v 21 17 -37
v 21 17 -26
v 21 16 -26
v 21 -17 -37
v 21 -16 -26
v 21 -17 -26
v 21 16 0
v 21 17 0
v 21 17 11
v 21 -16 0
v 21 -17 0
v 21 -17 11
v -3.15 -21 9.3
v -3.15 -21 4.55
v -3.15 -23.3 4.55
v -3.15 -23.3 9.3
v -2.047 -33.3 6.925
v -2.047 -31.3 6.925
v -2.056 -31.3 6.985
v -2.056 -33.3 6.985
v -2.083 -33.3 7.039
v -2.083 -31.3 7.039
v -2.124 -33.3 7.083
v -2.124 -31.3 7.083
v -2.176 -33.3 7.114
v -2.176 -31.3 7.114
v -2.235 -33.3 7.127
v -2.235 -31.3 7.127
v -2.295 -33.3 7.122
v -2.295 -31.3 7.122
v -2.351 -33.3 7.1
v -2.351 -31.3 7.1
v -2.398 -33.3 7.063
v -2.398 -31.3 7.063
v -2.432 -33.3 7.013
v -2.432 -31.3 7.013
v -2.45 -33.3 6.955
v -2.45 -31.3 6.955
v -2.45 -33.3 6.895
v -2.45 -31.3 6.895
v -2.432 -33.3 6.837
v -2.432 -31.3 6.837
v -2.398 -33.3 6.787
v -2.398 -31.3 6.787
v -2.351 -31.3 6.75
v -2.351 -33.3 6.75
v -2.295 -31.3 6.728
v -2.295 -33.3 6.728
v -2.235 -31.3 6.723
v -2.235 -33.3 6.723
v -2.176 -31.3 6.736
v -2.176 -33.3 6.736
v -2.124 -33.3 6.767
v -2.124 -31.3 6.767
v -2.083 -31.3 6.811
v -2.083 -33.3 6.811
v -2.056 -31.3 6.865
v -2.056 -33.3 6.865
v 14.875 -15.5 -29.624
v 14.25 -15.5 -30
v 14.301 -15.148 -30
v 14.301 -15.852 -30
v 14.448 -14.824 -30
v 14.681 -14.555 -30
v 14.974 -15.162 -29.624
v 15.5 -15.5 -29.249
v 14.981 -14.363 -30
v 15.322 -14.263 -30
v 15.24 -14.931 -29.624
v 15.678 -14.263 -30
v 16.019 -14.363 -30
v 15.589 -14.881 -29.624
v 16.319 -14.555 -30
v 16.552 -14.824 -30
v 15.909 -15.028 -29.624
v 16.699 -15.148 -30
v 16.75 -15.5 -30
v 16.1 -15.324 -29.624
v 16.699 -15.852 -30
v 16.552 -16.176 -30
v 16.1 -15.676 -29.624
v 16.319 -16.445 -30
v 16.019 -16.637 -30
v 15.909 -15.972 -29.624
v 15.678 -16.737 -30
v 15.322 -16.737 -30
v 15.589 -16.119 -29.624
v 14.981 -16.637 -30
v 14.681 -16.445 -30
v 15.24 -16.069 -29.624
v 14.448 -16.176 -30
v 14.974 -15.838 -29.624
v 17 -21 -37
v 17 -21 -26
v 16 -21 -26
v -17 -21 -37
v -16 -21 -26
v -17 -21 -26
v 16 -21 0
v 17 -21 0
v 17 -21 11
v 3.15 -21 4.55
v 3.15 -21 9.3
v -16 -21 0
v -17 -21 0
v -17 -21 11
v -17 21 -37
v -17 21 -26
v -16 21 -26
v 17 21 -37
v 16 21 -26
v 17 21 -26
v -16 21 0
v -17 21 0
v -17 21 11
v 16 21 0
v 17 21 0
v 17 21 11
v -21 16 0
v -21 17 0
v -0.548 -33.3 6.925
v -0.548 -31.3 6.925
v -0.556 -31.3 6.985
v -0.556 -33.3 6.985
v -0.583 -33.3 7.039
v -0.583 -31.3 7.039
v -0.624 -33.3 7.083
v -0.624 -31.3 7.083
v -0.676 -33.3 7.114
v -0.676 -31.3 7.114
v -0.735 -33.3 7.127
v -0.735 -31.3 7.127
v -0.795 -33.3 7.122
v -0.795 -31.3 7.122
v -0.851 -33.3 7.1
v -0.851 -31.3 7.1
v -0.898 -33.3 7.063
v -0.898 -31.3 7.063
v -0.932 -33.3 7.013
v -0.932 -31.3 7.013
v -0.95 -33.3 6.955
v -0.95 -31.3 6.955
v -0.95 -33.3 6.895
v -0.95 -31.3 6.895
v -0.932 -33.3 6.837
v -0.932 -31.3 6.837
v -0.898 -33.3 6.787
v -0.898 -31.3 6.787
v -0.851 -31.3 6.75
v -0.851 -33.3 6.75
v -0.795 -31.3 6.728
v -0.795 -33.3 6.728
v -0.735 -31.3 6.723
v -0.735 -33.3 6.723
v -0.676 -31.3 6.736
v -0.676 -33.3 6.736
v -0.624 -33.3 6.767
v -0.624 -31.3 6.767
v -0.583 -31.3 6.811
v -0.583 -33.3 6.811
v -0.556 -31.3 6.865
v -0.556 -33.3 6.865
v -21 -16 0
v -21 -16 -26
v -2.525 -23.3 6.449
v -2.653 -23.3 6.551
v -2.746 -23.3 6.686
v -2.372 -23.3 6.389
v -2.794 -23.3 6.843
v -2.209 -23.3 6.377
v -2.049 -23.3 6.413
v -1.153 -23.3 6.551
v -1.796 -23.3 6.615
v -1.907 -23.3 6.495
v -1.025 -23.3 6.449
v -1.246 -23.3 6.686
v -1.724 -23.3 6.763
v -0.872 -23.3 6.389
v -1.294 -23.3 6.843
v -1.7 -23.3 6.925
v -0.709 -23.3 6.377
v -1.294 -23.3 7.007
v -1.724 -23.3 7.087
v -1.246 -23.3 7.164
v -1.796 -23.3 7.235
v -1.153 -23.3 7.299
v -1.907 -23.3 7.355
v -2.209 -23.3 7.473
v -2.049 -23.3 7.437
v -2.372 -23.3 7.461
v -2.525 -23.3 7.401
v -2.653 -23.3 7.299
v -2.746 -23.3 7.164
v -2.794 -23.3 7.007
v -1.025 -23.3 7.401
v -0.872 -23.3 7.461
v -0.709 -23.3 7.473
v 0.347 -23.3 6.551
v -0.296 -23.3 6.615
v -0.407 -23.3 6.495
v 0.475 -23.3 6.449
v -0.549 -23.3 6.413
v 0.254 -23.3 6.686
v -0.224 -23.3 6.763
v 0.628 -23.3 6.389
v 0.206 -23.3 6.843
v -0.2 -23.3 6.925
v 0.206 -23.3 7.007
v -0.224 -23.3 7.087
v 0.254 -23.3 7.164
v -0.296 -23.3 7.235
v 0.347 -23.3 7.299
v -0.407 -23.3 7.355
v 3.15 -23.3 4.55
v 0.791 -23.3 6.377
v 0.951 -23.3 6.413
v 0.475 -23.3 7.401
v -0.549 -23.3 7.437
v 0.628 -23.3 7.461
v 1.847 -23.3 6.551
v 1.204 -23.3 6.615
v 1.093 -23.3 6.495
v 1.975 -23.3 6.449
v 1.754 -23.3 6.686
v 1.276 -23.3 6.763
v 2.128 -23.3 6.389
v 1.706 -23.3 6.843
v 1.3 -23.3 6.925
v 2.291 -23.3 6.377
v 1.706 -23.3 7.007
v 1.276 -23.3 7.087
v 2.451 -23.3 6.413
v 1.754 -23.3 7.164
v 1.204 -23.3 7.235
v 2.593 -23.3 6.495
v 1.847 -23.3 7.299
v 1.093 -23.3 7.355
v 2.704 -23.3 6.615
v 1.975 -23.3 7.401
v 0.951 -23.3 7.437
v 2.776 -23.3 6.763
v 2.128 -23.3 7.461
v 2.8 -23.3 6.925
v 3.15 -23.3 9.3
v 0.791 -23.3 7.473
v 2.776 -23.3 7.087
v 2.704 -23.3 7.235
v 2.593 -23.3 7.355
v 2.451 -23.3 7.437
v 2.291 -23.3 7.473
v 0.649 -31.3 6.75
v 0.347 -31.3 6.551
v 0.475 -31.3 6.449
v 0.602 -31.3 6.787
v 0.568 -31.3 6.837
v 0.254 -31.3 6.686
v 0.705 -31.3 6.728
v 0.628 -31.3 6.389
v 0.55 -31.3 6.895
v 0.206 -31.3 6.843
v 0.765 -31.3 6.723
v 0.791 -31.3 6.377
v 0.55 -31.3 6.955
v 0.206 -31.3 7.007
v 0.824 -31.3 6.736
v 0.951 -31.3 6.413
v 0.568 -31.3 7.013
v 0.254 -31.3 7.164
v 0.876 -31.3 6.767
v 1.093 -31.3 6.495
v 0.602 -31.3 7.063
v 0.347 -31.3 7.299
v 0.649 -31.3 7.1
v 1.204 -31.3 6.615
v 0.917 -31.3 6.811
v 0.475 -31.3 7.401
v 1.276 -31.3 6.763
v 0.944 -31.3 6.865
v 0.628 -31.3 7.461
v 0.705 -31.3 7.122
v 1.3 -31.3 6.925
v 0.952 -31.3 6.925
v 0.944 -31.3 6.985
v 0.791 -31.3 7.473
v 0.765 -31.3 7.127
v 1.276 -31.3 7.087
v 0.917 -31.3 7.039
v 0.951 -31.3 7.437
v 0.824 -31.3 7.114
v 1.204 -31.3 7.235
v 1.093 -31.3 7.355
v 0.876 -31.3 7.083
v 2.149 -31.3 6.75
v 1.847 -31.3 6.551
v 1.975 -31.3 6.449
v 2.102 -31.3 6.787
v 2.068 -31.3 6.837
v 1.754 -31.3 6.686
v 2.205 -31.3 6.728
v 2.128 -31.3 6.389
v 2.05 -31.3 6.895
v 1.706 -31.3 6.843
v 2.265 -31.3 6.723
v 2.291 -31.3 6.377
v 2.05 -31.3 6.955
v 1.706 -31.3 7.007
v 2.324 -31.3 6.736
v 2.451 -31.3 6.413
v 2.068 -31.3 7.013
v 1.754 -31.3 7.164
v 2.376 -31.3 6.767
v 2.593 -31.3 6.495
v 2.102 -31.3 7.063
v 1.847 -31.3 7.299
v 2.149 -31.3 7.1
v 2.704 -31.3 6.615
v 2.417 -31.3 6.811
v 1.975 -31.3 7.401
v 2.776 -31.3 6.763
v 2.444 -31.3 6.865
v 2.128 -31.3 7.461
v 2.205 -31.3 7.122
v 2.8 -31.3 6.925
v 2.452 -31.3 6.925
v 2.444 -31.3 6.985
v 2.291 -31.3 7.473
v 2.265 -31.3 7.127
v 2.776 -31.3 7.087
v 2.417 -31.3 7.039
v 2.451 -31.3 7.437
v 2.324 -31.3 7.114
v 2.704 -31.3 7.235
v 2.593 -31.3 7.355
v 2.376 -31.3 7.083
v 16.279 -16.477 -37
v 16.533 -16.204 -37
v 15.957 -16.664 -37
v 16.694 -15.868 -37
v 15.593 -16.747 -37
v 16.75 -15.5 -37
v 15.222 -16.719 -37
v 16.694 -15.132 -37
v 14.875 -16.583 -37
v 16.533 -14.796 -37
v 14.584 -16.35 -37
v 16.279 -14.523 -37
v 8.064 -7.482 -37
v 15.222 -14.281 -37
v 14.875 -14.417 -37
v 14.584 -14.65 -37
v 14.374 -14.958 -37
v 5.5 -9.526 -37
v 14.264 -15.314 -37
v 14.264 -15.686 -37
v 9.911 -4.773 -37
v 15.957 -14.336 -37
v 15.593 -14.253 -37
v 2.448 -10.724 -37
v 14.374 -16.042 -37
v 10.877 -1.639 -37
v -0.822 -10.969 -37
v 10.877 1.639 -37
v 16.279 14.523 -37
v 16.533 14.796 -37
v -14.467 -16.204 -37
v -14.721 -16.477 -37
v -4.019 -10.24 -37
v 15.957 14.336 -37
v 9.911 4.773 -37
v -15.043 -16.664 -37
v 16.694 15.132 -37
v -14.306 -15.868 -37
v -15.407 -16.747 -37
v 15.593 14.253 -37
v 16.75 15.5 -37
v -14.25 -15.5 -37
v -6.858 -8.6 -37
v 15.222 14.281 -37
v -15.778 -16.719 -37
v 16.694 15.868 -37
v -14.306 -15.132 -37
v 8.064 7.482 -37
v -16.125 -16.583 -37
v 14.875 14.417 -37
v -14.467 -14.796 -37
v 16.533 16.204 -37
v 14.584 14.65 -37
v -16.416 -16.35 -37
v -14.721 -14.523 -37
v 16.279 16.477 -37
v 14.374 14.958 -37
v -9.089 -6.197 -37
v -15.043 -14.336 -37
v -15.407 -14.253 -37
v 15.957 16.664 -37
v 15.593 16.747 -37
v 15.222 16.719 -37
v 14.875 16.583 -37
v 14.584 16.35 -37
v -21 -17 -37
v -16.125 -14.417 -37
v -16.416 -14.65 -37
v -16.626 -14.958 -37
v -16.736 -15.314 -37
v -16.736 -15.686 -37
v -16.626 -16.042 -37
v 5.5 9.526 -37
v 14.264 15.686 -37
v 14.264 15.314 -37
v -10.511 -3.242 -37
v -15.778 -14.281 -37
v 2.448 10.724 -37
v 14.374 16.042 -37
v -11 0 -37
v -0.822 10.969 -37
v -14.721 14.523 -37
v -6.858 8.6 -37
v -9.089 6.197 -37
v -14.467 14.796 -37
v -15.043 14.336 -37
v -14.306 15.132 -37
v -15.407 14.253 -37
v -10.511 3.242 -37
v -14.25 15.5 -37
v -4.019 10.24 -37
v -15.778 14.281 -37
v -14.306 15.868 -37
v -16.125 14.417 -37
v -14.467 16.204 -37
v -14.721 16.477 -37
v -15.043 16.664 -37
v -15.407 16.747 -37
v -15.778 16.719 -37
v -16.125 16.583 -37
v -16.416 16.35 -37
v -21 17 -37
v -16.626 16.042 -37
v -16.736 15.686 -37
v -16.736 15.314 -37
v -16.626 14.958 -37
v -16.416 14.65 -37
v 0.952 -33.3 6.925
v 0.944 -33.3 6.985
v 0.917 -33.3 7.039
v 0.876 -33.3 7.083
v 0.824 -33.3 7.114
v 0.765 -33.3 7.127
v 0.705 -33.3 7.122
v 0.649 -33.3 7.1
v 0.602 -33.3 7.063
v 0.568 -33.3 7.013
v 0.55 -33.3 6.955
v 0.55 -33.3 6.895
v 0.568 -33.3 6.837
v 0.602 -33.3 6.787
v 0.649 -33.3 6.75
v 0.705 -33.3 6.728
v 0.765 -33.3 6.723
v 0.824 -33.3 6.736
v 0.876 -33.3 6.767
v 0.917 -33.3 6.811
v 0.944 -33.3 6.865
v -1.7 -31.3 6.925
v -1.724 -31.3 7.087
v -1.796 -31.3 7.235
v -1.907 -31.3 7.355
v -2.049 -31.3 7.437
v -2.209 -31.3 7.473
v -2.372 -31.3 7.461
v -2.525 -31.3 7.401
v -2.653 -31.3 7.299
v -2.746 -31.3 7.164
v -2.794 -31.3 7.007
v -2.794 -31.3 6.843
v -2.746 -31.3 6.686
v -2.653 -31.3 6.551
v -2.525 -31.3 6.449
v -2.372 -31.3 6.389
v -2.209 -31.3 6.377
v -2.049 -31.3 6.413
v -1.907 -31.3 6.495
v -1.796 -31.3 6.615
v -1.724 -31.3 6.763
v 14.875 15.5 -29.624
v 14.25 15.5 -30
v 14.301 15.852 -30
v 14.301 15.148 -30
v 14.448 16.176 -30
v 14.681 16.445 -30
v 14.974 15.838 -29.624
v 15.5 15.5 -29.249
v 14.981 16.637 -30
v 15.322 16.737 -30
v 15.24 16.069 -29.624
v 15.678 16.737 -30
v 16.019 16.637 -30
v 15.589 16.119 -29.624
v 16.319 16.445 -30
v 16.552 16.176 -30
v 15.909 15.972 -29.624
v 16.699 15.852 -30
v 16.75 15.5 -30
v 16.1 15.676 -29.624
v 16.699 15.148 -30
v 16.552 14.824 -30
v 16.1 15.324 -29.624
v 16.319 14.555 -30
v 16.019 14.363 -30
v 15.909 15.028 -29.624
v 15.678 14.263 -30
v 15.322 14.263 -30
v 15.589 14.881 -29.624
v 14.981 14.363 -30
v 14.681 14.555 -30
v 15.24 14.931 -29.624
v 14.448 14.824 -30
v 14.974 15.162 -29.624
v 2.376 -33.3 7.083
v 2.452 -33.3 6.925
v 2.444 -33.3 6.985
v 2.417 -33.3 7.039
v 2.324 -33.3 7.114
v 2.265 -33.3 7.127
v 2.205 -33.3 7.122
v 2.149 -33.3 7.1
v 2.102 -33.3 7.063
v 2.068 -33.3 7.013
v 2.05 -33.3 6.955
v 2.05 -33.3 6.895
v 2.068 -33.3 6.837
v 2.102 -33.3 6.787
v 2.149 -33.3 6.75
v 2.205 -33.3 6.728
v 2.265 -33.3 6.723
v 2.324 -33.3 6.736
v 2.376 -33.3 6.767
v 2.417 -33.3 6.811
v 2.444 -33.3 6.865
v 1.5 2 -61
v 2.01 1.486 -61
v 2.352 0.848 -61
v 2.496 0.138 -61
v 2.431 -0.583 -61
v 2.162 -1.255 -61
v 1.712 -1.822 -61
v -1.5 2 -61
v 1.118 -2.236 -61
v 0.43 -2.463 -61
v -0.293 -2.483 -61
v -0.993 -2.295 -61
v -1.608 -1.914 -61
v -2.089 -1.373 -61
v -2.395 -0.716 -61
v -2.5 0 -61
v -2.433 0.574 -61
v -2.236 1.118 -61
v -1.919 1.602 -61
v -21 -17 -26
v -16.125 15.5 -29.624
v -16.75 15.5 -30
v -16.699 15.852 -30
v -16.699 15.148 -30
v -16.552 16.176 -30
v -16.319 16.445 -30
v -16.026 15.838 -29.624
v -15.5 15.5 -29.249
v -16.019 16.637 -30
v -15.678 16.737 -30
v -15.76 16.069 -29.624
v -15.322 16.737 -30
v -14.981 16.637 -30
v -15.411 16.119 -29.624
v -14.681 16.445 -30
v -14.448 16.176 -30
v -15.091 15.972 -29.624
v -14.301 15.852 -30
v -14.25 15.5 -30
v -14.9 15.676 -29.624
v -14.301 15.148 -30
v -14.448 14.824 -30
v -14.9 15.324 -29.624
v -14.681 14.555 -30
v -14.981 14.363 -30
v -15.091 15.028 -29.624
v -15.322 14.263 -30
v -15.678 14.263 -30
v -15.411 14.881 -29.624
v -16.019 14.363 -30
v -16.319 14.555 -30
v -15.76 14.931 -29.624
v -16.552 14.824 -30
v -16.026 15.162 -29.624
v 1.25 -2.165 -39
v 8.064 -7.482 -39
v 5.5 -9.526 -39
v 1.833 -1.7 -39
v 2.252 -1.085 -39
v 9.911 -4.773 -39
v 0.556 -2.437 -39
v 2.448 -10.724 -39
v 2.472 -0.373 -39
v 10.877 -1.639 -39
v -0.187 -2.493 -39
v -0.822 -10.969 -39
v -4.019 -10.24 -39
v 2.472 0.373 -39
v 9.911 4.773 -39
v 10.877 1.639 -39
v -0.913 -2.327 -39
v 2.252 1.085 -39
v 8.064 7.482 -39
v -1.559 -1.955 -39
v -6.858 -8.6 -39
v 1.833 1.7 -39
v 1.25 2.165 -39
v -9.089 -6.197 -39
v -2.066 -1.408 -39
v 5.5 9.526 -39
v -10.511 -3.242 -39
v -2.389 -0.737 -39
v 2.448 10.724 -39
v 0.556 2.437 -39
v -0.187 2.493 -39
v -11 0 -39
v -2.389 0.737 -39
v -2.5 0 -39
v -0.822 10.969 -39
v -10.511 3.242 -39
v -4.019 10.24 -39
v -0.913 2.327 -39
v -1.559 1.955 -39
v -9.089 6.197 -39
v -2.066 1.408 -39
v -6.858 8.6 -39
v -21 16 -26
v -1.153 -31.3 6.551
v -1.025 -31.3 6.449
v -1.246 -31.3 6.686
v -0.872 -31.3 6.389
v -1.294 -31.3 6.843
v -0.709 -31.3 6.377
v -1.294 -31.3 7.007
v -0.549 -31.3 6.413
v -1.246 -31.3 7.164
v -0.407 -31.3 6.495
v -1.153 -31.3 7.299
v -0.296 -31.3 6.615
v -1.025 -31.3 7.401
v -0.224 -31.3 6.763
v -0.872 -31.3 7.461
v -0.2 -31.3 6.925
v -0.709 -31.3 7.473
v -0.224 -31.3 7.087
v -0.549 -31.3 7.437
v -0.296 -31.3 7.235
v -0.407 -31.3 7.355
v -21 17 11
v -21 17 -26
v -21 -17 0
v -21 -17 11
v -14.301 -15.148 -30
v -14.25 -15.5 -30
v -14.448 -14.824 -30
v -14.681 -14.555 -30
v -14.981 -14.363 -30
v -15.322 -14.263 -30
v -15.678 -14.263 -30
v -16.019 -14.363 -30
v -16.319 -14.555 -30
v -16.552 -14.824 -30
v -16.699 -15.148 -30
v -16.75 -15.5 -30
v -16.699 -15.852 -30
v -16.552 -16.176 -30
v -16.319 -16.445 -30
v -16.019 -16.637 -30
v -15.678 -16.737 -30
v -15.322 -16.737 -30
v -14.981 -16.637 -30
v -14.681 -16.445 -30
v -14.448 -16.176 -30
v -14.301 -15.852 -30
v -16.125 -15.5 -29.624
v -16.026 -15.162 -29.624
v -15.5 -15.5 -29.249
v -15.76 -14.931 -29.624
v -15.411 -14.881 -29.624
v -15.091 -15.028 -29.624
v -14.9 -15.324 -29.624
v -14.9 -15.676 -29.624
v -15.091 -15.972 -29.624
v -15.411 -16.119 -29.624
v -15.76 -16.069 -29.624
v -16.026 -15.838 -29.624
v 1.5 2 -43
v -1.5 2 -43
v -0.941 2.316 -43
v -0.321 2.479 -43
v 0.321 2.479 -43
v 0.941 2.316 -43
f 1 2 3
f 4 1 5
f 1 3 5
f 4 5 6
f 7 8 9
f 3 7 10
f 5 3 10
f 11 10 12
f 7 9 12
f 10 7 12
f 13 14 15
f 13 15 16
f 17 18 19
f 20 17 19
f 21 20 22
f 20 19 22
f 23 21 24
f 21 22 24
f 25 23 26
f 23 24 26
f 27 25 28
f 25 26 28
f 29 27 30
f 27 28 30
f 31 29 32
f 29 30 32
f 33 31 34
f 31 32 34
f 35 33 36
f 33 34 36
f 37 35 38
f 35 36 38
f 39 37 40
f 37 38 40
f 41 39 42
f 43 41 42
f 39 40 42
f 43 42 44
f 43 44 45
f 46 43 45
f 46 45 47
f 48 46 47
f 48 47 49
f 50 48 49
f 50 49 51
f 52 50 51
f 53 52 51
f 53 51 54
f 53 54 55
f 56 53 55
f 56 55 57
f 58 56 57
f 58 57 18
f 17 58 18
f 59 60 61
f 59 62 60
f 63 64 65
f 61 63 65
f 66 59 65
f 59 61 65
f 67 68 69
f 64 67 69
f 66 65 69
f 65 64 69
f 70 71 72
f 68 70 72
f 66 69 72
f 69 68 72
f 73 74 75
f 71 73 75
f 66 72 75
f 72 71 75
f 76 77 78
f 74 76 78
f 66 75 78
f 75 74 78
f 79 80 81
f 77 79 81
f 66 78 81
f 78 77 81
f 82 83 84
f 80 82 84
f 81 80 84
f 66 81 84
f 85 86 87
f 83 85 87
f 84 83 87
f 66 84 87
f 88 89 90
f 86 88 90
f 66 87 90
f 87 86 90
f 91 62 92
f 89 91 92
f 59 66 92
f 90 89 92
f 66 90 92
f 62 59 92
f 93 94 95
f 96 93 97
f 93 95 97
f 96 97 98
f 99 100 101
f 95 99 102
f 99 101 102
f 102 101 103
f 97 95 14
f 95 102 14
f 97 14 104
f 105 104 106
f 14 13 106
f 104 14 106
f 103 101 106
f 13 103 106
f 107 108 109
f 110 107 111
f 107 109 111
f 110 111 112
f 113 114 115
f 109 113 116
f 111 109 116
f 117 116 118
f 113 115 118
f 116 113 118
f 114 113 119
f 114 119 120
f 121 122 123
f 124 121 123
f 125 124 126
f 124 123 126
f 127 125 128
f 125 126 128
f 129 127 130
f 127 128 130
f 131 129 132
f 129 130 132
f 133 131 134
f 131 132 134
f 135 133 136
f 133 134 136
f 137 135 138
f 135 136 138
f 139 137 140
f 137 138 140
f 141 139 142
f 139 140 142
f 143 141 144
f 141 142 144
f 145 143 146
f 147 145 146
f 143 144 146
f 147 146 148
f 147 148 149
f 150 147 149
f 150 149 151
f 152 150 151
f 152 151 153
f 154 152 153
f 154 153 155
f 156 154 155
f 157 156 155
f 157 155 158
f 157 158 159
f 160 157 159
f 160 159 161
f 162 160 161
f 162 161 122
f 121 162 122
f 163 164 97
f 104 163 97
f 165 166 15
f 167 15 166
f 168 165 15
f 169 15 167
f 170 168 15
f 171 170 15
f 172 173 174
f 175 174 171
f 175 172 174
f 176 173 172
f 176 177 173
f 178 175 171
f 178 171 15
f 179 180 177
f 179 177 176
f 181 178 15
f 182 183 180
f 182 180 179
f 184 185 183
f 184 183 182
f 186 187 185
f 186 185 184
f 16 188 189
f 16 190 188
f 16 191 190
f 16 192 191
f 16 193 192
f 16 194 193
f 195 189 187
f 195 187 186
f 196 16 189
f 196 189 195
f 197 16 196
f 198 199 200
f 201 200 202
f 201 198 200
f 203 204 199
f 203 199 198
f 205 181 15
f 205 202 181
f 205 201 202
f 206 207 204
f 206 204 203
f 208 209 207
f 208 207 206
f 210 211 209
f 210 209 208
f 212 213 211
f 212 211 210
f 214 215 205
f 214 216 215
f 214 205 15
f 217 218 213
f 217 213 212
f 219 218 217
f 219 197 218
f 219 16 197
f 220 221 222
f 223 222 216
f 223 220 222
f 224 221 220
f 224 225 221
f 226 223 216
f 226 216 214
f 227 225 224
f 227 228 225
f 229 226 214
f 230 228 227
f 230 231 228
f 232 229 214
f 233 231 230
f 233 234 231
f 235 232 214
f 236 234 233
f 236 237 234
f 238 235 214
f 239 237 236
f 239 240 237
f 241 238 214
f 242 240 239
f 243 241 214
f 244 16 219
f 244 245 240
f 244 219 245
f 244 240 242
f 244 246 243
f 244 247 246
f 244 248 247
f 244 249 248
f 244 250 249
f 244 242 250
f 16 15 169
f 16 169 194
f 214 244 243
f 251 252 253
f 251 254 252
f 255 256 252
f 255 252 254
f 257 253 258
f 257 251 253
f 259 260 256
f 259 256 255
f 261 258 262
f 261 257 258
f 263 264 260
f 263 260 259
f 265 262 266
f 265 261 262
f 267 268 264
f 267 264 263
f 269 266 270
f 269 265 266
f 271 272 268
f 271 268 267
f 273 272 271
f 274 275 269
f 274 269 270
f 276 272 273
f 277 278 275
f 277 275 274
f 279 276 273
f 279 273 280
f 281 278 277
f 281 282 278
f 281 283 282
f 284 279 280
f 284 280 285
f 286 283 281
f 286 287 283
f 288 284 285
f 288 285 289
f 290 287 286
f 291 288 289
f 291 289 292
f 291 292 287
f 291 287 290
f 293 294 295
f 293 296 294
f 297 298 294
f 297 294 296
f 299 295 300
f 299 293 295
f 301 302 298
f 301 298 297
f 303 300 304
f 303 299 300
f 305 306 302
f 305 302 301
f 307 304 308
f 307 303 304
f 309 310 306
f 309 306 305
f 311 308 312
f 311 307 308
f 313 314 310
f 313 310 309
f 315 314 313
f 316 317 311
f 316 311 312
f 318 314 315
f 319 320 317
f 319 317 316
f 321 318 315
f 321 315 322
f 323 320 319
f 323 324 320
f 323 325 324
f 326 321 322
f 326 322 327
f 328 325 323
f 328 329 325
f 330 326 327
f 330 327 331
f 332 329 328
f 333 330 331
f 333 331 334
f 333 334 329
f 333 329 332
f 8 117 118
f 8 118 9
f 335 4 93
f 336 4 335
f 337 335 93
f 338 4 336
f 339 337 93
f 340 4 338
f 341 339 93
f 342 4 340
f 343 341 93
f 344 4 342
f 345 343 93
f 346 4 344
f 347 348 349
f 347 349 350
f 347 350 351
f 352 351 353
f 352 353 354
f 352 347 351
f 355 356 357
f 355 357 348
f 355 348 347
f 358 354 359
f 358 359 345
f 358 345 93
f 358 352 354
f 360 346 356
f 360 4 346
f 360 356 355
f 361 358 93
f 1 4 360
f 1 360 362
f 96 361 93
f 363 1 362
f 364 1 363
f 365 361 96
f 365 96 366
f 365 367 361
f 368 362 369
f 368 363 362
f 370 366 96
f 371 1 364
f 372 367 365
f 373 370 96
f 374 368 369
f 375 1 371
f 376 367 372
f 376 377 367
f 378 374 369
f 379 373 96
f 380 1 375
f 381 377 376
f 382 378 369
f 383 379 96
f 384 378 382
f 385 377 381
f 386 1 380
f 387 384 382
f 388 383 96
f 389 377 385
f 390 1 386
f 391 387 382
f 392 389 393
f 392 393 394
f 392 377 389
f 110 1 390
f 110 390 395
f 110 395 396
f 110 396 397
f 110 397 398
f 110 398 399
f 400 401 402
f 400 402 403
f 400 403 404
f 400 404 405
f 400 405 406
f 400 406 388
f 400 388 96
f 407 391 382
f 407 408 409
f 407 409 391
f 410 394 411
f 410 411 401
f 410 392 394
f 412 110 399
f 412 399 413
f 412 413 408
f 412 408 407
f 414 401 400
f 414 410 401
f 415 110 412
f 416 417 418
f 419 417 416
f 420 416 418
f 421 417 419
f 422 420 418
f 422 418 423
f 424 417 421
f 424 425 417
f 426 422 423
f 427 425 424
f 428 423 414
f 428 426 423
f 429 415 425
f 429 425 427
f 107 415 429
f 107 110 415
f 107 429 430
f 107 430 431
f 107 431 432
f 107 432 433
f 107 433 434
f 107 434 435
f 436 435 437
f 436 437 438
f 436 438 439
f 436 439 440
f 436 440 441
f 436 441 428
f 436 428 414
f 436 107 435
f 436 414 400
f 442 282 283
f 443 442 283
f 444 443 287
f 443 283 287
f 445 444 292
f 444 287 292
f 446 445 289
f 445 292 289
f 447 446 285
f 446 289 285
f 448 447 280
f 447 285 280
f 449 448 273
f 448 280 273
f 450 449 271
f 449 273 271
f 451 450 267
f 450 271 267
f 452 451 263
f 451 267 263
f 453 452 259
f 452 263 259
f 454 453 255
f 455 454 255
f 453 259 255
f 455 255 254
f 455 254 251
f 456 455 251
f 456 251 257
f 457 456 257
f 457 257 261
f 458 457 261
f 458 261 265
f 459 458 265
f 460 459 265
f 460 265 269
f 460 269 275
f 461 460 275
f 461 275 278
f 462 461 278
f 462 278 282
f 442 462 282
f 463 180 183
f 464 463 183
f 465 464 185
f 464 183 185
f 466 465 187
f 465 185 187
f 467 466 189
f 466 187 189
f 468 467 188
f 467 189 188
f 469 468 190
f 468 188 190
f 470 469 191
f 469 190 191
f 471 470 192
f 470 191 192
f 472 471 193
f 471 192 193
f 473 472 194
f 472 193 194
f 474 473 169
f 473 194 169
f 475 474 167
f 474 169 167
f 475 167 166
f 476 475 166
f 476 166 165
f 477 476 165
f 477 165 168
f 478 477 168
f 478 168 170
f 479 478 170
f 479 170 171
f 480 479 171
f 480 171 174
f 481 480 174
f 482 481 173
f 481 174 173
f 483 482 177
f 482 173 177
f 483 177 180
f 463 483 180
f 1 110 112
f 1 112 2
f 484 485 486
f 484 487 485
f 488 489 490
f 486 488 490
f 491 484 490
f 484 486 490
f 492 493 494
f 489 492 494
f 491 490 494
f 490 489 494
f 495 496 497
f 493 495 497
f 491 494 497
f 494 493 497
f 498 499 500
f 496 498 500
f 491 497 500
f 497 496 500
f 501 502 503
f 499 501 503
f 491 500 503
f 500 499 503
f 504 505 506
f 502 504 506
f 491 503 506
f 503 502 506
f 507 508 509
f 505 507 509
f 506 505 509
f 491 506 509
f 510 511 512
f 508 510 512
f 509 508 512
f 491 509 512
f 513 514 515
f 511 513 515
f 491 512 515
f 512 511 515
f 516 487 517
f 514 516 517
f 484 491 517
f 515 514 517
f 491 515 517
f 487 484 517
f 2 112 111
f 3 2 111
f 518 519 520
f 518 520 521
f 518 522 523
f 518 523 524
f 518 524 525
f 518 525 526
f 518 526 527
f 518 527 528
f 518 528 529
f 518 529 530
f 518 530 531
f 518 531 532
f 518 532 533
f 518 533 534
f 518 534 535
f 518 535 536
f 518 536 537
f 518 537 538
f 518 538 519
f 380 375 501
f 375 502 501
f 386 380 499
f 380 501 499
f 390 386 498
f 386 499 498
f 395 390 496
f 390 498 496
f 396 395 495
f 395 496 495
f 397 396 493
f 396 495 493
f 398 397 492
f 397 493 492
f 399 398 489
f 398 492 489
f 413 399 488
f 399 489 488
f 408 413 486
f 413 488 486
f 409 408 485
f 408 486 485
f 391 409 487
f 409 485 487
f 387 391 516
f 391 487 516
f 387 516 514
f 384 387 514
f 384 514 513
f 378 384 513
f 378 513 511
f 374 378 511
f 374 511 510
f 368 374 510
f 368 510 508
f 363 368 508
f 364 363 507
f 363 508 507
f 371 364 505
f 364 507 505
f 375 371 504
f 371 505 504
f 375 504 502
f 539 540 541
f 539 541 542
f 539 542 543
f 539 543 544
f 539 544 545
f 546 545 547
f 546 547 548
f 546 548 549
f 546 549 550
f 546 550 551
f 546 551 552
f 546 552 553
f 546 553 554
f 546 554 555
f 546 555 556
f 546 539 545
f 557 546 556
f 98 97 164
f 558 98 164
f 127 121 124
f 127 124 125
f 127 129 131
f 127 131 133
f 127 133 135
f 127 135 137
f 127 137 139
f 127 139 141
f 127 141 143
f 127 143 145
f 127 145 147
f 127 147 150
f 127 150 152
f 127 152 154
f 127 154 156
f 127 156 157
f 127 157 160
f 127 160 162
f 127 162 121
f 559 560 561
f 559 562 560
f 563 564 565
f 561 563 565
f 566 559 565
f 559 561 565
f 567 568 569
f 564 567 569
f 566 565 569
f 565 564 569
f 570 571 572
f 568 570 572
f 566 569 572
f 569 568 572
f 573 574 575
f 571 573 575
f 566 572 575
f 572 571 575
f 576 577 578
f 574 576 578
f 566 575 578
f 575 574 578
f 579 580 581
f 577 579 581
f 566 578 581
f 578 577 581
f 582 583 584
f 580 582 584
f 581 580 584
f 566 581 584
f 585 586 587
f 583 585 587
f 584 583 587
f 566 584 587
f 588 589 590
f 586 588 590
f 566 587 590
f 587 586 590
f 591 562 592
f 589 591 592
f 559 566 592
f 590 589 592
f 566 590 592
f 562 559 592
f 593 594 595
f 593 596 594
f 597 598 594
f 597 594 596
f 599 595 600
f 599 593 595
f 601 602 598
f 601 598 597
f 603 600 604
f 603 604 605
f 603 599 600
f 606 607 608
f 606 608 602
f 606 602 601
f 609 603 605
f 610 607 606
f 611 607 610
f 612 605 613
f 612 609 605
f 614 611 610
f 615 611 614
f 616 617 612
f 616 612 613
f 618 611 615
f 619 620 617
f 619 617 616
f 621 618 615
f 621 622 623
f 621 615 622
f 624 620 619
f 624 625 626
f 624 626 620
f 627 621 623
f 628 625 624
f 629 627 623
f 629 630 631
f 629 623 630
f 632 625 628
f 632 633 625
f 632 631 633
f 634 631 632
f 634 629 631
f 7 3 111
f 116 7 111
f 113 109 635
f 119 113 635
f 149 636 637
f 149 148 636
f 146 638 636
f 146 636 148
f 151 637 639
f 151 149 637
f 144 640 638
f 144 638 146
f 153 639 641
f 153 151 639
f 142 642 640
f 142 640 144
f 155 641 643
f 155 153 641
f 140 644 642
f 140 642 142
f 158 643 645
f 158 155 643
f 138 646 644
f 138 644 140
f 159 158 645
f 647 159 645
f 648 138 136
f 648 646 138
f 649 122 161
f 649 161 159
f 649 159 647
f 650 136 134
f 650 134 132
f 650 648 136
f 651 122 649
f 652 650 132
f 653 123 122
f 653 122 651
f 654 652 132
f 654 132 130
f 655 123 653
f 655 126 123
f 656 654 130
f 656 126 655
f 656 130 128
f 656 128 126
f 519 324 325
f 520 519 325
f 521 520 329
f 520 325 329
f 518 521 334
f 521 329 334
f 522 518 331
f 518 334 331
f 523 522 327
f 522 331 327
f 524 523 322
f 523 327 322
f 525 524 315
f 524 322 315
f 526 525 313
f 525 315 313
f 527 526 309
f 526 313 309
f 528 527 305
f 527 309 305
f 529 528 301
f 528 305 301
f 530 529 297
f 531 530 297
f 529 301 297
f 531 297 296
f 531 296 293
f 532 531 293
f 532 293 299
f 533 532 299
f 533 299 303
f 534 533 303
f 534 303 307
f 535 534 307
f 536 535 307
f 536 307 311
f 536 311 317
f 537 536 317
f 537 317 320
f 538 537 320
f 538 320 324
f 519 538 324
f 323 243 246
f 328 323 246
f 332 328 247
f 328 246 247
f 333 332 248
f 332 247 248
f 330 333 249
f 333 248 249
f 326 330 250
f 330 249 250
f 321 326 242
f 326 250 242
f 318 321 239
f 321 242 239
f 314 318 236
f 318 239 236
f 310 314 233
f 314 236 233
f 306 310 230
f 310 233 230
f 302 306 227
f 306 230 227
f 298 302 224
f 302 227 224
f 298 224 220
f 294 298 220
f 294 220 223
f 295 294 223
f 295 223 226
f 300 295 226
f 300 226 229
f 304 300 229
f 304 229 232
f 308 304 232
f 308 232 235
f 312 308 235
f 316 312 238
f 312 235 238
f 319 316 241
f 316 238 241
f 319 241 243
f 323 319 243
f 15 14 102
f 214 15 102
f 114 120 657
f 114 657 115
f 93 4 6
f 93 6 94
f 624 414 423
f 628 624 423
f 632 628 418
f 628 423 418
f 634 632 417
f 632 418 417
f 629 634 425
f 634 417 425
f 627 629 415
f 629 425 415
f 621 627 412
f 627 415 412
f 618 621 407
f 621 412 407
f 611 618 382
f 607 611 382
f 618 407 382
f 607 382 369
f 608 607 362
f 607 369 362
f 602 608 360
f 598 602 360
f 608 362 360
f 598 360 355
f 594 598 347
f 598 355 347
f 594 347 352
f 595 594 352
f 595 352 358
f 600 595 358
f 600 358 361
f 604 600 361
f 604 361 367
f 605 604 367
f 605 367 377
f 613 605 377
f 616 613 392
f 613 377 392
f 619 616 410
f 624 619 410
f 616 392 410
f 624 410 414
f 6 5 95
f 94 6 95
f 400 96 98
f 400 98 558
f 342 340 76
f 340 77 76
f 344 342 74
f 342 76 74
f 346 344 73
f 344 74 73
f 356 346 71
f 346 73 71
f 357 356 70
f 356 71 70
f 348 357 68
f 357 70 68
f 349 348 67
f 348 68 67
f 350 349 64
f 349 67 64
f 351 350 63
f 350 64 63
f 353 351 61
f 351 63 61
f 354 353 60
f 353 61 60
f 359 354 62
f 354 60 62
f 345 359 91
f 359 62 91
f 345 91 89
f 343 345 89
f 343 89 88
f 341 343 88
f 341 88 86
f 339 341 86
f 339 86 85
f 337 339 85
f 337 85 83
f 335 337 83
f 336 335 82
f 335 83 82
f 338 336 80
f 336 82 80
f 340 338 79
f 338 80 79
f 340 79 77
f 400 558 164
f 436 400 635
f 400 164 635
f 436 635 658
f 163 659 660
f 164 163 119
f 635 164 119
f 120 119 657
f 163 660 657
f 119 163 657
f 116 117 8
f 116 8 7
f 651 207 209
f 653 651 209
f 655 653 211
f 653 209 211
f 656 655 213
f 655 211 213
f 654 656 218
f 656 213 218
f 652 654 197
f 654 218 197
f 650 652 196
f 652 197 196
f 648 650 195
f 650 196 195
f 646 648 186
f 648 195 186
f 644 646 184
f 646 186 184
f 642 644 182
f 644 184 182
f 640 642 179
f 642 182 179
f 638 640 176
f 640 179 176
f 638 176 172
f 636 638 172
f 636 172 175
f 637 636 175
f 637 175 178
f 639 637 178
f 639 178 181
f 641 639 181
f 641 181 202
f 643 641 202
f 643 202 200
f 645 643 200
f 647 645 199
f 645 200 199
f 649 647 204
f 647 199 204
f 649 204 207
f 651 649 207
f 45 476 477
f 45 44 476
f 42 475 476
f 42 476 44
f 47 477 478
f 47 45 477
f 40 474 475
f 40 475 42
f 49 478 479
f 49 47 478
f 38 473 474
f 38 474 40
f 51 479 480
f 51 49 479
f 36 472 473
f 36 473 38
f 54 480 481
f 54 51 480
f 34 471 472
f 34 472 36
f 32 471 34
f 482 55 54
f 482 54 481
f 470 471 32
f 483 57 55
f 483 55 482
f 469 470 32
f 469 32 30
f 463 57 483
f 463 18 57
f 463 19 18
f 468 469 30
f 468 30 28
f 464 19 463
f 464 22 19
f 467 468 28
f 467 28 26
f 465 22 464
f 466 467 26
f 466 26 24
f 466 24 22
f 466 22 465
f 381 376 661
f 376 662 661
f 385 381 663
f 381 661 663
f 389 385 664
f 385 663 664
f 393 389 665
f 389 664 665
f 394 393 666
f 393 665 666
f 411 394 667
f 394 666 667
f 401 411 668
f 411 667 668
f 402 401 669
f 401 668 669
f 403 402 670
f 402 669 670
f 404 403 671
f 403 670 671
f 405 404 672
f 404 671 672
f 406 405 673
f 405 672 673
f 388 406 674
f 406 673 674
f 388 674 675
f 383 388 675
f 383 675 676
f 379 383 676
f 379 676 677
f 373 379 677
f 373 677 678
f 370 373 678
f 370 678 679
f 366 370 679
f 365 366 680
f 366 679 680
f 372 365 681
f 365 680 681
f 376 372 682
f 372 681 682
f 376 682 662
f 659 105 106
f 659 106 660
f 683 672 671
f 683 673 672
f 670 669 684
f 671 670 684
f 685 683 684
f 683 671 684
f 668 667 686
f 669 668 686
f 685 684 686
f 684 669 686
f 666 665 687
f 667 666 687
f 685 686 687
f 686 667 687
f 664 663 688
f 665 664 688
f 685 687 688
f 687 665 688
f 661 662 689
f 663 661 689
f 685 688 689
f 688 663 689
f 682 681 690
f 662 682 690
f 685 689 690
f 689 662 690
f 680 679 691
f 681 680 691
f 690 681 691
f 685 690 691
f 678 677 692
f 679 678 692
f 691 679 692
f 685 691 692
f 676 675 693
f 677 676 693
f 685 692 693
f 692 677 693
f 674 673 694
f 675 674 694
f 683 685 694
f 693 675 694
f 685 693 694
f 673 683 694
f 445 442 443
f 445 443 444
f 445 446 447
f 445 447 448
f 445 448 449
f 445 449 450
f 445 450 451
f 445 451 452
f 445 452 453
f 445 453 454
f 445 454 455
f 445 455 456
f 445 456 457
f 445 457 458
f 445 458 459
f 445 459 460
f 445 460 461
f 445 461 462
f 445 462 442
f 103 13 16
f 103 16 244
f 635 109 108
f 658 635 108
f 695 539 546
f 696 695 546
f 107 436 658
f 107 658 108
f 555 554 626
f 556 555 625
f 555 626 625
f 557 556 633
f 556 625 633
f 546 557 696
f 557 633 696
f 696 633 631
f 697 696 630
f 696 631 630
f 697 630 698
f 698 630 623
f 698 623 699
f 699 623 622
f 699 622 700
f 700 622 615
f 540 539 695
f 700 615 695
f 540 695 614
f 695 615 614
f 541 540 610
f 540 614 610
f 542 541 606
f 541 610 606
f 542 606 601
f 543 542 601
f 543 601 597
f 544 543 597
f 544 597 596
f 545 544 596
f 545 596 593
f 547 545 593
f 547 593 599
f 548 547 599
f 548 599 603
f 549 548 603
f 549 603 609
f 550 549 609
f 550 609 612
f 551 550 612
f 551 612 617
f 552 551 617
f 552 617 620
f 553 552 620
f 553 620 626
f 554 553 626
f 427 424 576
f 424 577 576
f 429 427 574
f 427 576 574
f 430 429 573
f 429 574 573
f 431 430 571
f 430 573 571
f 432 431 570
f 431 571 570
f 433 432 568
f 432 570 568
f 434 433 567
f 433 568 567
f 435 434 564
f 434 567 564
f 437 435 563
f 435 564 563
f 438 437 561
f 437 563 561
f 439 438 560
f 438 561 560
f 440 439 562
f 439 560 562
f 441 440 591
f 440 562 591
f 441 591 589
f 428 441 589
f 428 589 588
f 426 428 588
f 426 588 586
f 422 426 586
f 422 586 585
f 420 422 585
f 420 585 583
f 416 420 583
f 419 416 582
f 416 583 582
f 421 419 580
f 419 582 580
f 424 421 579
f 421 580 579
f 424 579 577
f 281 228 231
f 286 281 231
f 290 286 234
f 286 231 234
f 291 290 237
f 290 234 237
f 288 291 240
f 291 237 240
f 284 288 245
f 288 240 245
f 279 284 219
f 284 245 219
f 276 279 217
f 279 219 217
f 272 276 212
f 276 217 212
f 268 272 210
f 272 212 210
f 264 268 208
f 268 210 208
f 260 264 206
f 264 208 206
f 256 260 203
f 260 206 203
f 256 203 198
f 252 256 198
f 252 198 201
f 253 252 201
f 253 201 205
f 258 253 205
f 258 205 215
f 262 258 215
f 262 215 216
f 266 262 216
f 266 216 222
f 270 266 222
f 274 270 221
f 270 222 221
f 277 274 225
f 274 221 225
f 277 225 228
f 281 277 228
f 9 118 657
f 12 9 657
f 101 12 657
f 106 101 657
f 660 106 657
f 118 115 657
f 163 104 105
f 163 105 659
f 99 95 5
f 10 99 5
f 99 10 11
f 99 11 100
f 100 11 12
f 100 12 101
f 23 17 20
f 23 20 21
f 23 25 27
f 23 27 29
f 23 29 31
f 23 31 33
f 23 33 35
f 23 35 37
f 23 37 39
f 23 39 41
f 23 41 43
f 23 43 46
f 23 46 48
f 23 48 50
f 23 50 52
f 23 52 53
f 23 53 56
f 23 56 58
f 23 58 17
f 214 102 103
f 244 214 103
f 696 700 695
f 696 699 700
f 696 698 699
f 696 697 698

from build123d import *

# Parameters (mm, degrees)
BOSS_EXTRU_1_DEPTH      = 11
BOSS_EXTRU_2_DEPTH      = 26
BOSS_EXTRU_3_DEPTH      = 11
ESQUISSE4_R             = 11
BOSS_EXTRU_4_DEPTH      = 2
ESQUISSE5_R             = 2.5
BOSS_EXTRU_5_DEPTH      = 22
ESQUISSE6_W             = 5.798316384
ESQUISSE6_H             = 1
ENL_V_MAT_EXTRU_1_DEPTH = 18
TROU_TARAUD_M31_D       = 2.5
TROU_TARAUD_M31_DEPTH   = 7
TROU_TARAUD_M31_TIP     = 0.751075774
ESQUISSE9_W             = 6.3
ESQUISSE9_H             = 4.75
BOSS_EXTRU_6_DEPTH      = 2.3
ESQUISSE10_R            = 0.2025
BOSS_EXTRU_7_DEPTH      = 10
ESQUISSE11_R            = 0.55
BOSS_EXTRU_8_DEPTH      = 8


with BuildPart() as part:
    # Esquisse1 → Boss.-Extru.1 (new body)
    with BuildSketch(Plane.XY):
        Polygon((17, 21), (21, 17), (21, -17), (17, -21), (-17, -21), (-21, -17), (-21, 17), (-17, 21), align=None)
    extrude(amount=BOSS_EXTRU_1_DEPTH)

    # Esquisse2 → Boss.-Extru.2 (add)
    with BuildSketch(Plane(origin=(0, 0, 0), x_dir=(-1, 0, 0), z_dir=(0, 0, -1))):
        Polygon((-16, 21), (16, 21), (21, 16), (21, -16), (16, -21), (-16, -21), (-21, -16), (-21, 16), align=None)
    extrude(amount=BOSS_EXTRU_2_DEPTH)

    # Esquisse3 → Boss.-Extru.3 (add)
    with BuildSketch(Plane(origin=(0, 0, -26), x_dir=(-1, 0, 0), z_dir=(0, 0, -1))):
        Polygon((-17, 21), (-21, 17), (-21, -17), (-17, -21), (17, -21), (21, -17), (21, 17), (17, 21), align=None)
    extrude(amount=BOSS_EXTRU_3_DEPTH)

    # Esquisse4 → Boss.-Extru.4 (add)
    with BuildSketch(Plane(origin=(0, 0, -37), x_dir=(-1, 0, 0), z_dir=(0, 0, -1))):
        Circle(ESQUISSE4_R)
    extrude(amount=BOSS_EXTRU_4_DEPTH)

    # Esquisse5 → Boss.-Extru.5 (add)
    with BuildSketch(Plane(origin=(0, 0, -39), x_dir=(-1, 0, 0), z_dir=(0, 0, -1))):
        Circle(ESQUISSE5_R)
    extrude(amount=BOSS_EXTRU_5_DEPTH)

    # Esquisse6 → Enlèv. mat.-Extru.1 (cut)
    with BuildSketch(Plane(origin=(0, 0, -61), x_dir=(-1, 0, 0), z_dir=(0, 0, -1))):
        with Locations((0, 2.5)):
            Rectangle(ESQUISSE6_W, ESQUISSE6_H)
    extrude(amount=-ENL_V_MAT_EXTRU_1_DEPTH, mode=Mode.SUBTRACT)

    # Trou taraudé M31
    with Locations(Plane(origin=(0, 0, -37), x_dir=(-1, 0, 0), z_dir=(0, 0, -1))):
        with Locations((-15.5, 15.5), (15.5, 15.5), (15.5, -15.5), (-15.5, -15.5)):
            Hole(TROU_TARAUD_M31_D / 2, depth=TROU_TARAUD_M31_DEPTH)
            with Locations((0, 0, -(TROU_TARAUD_M31_DEPTH + TROU_TARAUD_M31_TIP / 2))):  # 118° drill point
                Cone(0, TROU_TARAUD_M31_D / 2, TROU_TARAUD_M31_TIP, mode=Mode.SUBTRACT)

    # Esquisse9 → Boss.-Extru.6 (add)
    with BuildSketch(Plane.XZ.offset(21)):
        with Locations((0, 6.925)):
            Rectangle(ESQUISSE9_W, ESQUISSE9_H)
    extrude(amount=BOSS_EXTRU_6_DEPTH)

    # Esquisse10 → Boss.-Extru.7 (add)
    with BuildSketch(Plane.XZ.offset(23.3)):
        with Locations((-2.25, 6.925)):
            Circle(ESQUISSE10_R)
        with Locations((-0.75, 6.925)):
            Circle(ESQUISSE10_R)
        with Locations((0.75, 6.925)):
            Circle(ESQUISSE10_R)
        with Locations((2.25, 6.925)):
            Circle(ESQUISSE10_R)
    extrude(amount=BOSS_EXTRU_7_DEPTH)

    # Esquisse11 → Boss.-Extru.8 (add)
    with BuildSketch(Plane.XZ.offset(23.3)):
        with Locations((-2.25, 6.925)):
            Circle(ESQUISSE11_R)
        with Locations((-0.75, 6.925)):
            Circle(ESQUISSE11_R)
        with Locations((0.75, 6.925)):
            Circle(ESQUISSE11_R)
        with Locations((2.25, 6.925)):
            Circle(ESQUISSE11_R)
    extrude(amount=BOSS_EXTRU_8_DEPTH)


solid = part.part
